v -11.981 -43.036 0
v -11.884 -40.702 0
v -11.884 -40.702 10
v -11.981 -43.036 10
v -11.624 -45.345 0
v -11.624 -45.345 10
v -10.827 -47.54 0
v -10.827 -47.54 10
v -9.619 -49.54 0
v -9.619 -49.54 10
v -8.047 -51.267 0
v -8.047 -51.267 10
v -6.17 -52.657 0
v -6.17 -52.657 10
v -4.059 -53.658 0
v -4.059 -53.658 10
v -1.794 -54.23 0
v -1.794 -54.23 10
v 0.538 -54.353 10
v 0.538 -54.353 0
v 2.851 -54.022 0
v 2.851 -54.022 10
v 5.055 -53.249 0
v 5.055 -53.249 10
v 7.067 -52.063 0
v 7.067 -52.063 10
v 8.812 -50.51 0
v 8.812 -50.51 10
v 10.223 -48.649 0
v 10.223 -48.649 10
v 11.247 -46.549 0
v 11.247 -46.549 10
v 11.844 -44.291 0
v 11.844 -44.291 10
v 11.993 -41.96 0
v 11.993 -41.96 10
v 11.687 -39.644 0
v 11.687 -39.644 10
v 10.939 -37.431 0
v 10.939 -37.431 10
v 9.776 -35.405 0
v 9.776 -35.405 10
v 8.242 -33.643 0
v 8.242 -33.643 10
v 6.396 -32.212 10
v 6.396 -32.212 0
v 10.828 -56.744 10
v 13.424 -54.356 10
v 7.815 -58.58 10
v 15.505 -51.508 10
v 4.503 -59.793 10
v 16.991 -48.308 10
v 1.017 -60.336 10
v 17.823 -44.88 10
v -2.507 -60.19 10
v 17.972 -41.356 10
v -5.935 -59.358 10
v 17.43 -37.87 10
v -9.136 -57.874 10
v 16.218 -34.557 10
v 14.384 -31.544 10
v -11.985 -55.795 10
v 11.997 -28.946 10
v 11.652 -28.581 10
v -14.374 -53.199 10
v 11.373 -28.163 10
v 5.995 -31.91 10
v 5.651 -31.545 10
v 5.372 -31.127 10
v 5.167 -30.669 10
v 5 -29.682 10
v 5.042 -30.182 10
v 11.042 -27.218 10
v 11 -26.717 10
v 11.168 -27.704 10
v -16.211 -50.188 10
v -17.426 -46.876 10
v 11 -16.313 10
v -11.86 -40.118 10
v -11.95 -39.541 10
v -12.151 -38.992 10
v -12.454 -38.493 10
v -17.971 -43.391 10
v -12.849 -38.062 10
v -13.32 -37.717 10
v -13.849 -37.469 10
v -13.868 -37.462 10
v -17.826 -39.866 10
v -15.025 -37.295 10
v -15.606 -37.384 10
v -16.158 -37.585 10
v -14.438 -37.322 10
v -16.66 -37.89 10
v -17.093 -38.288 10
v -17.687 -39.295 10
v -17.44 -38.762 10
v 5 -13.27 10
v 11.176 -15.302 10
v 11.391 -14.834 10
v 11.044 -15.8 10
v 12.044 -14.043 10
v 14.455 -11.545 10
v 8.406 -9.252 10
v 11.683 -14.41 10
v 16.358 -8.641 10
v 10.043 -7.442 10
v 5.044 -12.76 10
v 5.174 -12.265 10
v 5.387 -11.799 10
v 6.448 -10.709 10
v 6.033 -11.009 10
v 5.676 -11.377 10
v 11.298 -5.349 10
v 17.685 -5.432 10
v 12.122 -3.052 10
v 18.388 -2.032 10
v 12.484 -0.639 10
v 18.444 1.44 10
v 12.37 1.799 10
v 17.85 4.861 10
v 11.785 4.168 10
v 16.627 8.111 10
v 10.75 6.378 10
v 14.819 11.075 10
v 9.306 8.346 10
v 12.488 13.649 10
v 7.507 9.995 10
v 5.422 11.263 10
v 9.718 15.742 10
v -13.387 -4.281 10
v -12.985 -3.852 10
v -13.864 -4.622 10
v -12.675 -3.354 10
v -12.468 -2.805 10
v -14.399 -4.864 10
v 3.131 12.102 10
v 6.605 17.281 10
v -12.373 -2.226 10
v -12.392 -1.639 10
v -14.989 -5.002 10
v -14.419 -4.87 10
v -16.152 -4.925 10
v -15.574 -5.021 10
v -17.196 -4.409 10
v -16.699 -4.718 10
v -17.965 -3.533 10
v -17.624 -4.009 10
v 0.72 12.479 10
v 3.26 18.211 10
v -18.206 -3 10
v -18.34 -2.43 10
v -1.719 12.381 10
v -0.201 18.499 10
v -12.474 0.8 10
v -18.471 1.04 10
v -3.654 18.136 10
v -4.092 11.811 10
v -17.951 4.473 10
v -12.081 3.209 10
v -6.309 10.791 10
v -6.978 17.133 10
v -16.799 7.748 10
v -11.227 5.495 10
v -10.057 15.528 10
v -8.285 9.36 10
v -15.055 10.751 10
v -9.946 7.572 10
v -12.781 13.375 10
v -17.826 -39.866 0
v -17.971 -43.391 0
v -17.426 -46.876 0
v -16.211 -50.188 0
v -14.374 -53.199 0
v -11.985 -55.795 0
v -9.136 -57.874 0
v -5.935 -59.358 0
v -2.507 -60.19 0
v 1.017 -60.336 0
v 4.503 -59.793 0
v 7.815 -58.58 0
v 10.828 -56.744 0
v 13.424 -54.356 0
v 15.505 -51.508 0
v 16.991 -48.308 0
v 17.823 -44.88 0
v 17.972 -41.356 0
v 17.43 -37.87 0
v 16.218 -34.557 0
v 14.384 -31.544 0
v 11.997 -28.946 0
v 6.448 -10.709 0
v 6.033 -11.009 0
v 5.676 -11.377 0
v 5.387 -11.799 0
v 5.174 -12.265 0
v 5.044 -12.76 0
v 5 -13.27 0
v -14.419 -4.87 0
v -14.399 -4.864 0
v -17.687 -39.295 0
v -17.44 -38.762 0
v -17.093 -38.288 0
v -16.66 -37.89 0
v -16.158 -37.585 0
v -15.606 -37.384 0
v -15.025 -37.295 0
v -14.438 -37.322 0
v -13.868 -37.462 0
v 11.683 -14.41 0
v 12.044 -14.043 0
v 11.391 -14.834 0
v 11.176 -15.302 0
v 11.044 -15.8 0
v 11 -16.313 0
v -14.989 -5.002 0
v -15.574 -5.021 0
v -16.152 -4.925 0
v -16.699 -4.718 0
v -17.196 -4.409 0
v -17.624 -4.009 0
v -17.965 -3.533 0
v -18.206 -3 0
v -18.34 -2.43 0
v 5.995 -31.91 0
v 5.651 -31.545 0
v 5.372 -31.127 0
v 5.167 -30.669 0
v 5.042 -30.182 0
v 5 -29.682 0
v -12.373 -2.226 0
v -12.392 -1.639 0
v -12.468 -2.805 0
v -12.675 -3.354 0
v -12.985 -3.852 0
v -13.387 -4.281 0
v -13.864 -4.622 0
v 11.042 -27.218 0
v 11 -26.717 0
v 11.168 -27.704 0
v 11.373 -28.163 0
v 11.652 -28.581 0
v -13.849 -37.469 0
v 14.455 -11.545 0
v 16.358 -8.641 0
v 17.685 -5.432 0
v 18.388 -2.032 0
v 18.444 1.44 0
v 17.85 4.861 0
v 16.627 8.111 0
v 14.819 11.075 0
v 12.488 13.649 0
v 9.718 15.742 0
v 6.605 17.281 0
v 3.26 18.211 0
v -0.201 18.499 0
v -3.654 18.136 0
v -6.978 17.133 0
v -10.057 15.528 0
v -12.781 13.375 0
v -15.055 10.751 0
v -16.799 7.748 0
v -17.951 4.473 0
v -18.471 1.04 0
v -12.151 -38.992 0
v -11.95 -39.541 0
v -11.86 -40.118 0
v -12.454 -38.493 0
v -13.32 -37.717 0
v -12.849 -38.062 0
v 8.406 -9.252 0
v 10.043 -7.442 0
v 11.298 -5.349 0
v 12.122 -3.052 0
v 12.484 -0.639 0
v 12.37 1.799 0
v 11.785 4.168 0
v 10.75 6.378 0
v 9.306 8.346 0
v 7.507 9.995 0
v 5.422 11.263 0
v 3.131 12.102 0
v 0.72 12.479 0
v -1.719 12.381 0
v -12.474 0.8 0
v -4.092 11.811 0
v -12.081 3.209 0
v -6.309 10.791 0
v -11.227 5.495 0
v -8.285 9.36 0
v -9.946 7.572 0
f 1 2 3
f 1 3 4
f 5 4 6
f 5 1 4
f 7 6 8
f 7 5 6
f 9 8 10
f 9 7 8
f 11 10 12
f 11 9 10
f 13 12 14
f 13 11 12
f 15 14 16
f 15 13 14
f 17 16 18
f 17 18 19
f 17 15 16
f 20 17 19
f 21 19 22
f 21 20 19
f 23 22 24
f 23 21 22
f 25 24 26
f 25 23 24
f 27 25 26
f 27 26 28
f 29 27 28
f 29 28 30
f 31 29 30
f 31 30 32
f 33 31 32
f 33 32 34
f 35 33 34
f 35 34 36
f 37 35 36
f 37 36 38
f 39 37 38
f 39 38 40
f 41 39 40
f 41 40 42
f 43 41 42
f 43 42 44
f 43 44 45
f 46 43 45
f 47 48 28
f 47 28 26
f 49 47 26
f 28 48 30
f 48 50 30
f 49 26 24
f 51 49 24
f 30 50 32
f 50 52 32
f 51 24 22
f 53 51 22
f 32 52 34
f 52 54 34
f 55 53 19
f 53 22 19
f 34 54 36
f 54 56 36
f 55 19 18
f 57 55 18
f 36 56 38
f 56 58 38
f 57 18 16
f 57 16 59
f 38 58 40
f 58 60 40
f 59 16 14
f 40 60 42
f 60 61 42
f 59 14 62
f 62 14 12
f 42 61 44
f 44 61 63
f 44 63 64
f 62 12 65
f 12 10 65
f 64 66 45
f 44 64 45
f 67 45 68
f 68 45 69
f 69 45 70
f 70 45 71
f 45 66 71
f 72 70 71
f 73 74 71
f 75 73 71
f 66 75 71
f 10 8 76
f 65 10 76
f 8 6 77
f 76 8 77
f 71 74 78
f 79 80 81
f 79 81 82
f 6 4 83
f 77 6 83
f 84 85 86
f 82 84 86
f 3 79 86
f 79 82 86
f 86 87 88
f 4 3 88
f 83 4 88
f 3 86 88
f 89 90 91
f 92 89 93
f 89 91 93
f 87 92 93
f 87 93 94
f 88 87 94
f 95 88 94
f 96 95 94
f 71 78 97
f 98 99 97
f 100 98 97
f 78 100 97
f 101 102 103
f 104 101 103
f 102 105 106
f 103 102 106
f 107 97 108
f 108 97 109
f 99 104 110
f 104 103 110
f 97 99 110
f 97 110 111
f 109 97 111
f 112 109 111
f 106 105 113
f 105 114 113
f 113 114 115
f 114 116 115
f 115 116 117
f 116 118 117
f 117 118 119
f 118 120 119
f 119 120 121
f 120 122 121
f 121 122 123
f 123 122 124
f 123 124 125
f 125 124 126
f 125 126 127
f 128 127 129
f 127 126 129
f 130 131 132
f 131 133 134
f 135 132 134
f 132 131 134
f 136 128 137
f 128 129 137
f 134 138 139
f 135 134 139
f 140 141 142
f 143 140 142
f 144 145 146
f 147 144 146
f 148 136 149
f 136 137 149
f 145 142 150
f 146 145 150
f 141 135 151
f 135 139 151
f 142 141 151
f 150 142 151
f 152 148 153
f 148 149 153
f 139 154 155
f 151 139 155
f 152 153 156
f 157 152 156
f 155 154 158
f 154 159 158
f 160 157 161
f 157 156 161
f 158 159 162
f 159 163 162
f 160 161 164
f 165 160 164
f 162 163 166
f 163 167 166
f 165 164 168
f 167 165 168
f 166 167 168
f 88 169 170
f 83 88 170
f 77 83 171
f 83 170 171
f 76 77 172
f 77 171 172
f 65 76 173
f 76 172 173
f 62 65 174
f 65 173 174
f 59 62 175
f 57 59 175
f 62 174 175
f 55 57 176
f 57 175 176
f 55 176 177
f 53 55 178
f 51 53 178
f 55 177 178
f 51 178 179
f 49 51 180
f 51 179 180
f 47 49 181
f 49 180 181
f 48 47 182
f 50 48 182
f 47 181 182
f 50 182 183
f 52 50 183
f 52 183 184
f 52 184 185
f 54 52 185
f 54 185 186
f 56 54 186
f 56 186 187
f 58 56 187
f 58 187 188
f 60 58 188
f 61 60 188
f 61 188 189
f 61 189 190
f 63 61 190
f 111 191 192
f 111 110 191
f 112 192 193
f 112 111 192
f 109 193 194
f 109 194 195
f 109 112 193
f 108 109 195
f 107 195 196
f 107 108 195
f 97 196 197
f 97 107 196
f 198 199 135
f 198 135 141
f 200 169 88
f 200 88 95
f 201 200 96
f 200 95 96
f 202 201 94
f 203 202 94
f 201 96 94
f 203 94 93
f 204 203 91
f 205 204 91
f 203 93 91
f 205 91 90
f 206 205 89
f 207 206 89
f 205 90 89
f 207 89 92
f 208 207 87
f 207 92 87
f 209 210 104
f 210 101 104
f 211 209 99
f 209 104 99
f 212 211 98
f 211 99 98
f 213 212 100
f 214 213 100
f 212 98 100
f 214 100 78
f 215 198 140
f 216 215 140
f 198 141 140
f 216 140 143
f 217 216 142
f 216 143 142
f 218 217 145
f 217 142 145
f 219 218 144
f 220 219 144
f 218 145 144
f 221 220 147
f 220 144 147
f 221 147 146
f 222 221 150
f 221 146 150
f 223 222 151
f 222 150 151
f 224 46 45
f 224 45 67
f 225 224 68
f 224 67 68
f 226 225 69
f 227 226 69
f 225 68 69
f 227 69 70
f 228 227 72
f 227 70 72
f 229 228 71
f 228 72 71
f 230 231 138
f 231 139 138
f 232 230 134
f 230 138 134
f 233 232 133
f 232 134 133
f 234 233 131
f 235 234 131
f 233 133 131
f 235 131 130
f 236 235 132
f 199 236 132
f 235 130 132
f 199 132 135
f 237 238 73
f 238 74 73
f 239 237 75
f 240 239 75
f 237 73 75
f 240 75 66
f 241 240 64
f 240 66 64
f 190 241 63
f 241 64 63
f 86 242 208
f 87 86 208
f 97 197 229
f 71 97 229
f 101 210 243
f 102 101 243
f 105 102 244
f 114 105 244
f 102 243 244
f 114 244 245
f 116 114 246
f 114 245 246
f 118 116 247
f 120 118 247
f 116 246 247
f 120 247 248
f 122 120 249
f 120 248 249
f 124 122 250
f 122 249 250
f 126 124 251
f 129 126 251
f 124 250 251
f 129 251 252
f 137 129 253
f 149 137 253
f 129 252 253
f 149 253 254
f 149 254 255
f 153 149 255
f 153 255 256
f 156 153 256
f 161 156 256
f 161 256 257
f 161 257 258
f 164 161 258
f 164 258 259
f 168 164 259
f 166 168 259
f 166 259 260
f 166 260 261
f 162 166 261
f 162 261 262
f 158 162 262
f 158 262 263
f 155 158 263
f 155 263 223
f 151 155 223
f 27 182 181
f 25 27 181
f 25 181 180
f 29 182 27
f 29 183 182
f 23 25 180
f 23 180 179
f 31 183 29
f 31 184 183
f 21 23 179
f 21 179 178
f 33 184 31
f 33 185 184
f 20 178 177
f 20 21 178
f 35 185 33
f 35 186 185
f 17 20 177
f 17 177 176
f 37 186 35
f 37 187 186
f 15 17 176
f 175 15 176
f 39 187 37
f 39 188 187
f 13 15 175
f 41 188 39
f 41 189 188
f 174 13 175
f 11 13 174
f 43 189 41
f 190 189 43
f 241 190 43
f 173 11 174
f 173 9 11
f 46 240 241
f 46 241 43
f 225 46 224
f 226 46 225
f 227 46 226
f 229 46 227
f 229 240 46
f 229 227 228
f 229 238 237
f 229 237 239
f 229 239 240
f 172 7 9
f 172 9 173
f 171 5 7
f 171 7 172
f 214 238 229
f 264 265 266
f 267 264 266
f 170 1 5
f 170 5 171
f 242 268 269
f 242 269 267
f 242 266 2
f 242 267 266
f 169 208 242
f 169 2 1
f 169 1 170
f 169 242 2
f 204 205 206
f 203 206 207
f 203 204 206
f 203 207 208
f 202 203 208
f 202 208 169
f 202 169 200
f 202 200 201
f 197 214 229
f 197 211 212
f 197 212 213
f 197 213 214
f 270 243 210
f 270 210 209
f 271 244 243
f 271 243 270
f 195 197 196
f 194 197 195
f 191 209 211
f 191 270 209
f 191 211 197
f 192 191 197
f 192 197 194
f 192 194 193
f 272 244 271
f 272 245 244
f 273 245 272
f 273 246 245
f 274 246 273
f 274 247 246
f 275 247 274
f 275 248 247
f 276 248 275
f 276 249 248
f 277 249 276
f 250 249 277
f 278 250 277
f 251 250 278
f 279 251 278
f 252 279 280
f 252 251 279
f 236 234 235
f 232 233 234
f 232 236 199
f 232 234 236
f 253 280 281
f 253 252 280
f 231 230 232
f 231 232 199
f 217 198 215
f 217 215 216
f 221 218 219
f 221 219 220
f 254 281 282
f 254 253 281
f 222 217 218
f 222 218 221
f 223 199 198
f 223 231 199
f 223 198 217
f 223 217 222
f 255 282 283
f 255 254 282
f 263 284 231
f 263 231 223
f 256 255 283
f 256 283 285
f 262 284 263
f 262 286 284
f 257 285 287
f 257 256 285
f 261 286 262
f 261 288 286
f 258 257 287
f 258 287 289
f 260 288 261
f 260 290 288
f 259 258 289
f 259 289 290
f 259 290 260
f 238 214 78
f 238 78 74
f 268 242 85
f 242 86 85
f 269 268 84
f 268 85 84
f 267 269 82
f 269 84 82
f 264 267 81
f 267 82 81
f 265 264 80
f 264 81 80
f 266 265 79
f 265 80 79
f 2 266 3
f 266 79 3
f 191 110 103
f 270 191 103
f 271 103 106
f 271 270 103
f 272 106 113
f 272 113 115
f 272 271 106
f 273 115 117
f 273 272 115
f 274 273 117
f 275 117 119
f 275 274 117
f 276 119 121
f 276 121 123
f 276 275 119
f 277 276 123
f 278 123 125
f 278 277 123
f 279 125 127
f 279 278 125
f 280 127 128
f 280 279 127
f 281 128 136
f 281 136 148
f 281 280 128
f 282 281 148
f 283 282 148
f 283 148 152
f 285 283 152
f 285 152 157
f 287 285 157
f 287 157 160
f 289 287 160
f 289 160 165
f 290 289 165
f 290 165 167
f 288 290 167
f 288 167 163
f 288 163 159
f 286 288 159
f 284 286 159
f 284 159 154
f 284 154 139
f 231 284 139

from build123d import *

# Parameters (mm, degrees)
PAD_DEPTH = 10
FILLET_R  = 2.99


with BuildPart() as part:
    # Sketch → Pad (new body)
    with BuildSketch(Plane.XY):
        with BuildLine():
            ThreePointArc((5, -11.456439), (5.06017, 11.42999), (-11.842719, -4))
            Line((-11.842719, -4), (-17.527225, -5.92))
            ThreePointArc((11, -14.874475), (5.540471, 17.650869), (-17.527225, -5.92))
            Line((11, -14.874475), (11, -28.117345))
            ThreePointArc((-16.970563, -36.365151), (5.09102, -59.630189), (11, -28.117345))
            Line((-11.313708, -38.365151), (-16.970563, -36.365151))
            ThreePointArc((-11.313708, -38.365151), (4.679562, -53.415115), (5, -31.456439))
            Line((5, -11.456439), (5, -31.456439))
        make_face()
    extrude(amount=PAD_DEPTH)

    # Fillet
    fillet_edges = [part.edges().sort_by_distance(p)[0] for p in [
        (-17.527225, -5.92, 5),
        (-11.842719, -4, 5),
        (-11.313708, -38.365151, 5),
        (-16.970563, -36.365151, 5),
        (5, -31.456439, 5),
        (5, -11.456439, 5),
        (11, -14.874475, 5),
        (11, -28.117345, 5),
    ]]
    fillet(fillet_edges, radius=FILLET_R)


solid = part.part
